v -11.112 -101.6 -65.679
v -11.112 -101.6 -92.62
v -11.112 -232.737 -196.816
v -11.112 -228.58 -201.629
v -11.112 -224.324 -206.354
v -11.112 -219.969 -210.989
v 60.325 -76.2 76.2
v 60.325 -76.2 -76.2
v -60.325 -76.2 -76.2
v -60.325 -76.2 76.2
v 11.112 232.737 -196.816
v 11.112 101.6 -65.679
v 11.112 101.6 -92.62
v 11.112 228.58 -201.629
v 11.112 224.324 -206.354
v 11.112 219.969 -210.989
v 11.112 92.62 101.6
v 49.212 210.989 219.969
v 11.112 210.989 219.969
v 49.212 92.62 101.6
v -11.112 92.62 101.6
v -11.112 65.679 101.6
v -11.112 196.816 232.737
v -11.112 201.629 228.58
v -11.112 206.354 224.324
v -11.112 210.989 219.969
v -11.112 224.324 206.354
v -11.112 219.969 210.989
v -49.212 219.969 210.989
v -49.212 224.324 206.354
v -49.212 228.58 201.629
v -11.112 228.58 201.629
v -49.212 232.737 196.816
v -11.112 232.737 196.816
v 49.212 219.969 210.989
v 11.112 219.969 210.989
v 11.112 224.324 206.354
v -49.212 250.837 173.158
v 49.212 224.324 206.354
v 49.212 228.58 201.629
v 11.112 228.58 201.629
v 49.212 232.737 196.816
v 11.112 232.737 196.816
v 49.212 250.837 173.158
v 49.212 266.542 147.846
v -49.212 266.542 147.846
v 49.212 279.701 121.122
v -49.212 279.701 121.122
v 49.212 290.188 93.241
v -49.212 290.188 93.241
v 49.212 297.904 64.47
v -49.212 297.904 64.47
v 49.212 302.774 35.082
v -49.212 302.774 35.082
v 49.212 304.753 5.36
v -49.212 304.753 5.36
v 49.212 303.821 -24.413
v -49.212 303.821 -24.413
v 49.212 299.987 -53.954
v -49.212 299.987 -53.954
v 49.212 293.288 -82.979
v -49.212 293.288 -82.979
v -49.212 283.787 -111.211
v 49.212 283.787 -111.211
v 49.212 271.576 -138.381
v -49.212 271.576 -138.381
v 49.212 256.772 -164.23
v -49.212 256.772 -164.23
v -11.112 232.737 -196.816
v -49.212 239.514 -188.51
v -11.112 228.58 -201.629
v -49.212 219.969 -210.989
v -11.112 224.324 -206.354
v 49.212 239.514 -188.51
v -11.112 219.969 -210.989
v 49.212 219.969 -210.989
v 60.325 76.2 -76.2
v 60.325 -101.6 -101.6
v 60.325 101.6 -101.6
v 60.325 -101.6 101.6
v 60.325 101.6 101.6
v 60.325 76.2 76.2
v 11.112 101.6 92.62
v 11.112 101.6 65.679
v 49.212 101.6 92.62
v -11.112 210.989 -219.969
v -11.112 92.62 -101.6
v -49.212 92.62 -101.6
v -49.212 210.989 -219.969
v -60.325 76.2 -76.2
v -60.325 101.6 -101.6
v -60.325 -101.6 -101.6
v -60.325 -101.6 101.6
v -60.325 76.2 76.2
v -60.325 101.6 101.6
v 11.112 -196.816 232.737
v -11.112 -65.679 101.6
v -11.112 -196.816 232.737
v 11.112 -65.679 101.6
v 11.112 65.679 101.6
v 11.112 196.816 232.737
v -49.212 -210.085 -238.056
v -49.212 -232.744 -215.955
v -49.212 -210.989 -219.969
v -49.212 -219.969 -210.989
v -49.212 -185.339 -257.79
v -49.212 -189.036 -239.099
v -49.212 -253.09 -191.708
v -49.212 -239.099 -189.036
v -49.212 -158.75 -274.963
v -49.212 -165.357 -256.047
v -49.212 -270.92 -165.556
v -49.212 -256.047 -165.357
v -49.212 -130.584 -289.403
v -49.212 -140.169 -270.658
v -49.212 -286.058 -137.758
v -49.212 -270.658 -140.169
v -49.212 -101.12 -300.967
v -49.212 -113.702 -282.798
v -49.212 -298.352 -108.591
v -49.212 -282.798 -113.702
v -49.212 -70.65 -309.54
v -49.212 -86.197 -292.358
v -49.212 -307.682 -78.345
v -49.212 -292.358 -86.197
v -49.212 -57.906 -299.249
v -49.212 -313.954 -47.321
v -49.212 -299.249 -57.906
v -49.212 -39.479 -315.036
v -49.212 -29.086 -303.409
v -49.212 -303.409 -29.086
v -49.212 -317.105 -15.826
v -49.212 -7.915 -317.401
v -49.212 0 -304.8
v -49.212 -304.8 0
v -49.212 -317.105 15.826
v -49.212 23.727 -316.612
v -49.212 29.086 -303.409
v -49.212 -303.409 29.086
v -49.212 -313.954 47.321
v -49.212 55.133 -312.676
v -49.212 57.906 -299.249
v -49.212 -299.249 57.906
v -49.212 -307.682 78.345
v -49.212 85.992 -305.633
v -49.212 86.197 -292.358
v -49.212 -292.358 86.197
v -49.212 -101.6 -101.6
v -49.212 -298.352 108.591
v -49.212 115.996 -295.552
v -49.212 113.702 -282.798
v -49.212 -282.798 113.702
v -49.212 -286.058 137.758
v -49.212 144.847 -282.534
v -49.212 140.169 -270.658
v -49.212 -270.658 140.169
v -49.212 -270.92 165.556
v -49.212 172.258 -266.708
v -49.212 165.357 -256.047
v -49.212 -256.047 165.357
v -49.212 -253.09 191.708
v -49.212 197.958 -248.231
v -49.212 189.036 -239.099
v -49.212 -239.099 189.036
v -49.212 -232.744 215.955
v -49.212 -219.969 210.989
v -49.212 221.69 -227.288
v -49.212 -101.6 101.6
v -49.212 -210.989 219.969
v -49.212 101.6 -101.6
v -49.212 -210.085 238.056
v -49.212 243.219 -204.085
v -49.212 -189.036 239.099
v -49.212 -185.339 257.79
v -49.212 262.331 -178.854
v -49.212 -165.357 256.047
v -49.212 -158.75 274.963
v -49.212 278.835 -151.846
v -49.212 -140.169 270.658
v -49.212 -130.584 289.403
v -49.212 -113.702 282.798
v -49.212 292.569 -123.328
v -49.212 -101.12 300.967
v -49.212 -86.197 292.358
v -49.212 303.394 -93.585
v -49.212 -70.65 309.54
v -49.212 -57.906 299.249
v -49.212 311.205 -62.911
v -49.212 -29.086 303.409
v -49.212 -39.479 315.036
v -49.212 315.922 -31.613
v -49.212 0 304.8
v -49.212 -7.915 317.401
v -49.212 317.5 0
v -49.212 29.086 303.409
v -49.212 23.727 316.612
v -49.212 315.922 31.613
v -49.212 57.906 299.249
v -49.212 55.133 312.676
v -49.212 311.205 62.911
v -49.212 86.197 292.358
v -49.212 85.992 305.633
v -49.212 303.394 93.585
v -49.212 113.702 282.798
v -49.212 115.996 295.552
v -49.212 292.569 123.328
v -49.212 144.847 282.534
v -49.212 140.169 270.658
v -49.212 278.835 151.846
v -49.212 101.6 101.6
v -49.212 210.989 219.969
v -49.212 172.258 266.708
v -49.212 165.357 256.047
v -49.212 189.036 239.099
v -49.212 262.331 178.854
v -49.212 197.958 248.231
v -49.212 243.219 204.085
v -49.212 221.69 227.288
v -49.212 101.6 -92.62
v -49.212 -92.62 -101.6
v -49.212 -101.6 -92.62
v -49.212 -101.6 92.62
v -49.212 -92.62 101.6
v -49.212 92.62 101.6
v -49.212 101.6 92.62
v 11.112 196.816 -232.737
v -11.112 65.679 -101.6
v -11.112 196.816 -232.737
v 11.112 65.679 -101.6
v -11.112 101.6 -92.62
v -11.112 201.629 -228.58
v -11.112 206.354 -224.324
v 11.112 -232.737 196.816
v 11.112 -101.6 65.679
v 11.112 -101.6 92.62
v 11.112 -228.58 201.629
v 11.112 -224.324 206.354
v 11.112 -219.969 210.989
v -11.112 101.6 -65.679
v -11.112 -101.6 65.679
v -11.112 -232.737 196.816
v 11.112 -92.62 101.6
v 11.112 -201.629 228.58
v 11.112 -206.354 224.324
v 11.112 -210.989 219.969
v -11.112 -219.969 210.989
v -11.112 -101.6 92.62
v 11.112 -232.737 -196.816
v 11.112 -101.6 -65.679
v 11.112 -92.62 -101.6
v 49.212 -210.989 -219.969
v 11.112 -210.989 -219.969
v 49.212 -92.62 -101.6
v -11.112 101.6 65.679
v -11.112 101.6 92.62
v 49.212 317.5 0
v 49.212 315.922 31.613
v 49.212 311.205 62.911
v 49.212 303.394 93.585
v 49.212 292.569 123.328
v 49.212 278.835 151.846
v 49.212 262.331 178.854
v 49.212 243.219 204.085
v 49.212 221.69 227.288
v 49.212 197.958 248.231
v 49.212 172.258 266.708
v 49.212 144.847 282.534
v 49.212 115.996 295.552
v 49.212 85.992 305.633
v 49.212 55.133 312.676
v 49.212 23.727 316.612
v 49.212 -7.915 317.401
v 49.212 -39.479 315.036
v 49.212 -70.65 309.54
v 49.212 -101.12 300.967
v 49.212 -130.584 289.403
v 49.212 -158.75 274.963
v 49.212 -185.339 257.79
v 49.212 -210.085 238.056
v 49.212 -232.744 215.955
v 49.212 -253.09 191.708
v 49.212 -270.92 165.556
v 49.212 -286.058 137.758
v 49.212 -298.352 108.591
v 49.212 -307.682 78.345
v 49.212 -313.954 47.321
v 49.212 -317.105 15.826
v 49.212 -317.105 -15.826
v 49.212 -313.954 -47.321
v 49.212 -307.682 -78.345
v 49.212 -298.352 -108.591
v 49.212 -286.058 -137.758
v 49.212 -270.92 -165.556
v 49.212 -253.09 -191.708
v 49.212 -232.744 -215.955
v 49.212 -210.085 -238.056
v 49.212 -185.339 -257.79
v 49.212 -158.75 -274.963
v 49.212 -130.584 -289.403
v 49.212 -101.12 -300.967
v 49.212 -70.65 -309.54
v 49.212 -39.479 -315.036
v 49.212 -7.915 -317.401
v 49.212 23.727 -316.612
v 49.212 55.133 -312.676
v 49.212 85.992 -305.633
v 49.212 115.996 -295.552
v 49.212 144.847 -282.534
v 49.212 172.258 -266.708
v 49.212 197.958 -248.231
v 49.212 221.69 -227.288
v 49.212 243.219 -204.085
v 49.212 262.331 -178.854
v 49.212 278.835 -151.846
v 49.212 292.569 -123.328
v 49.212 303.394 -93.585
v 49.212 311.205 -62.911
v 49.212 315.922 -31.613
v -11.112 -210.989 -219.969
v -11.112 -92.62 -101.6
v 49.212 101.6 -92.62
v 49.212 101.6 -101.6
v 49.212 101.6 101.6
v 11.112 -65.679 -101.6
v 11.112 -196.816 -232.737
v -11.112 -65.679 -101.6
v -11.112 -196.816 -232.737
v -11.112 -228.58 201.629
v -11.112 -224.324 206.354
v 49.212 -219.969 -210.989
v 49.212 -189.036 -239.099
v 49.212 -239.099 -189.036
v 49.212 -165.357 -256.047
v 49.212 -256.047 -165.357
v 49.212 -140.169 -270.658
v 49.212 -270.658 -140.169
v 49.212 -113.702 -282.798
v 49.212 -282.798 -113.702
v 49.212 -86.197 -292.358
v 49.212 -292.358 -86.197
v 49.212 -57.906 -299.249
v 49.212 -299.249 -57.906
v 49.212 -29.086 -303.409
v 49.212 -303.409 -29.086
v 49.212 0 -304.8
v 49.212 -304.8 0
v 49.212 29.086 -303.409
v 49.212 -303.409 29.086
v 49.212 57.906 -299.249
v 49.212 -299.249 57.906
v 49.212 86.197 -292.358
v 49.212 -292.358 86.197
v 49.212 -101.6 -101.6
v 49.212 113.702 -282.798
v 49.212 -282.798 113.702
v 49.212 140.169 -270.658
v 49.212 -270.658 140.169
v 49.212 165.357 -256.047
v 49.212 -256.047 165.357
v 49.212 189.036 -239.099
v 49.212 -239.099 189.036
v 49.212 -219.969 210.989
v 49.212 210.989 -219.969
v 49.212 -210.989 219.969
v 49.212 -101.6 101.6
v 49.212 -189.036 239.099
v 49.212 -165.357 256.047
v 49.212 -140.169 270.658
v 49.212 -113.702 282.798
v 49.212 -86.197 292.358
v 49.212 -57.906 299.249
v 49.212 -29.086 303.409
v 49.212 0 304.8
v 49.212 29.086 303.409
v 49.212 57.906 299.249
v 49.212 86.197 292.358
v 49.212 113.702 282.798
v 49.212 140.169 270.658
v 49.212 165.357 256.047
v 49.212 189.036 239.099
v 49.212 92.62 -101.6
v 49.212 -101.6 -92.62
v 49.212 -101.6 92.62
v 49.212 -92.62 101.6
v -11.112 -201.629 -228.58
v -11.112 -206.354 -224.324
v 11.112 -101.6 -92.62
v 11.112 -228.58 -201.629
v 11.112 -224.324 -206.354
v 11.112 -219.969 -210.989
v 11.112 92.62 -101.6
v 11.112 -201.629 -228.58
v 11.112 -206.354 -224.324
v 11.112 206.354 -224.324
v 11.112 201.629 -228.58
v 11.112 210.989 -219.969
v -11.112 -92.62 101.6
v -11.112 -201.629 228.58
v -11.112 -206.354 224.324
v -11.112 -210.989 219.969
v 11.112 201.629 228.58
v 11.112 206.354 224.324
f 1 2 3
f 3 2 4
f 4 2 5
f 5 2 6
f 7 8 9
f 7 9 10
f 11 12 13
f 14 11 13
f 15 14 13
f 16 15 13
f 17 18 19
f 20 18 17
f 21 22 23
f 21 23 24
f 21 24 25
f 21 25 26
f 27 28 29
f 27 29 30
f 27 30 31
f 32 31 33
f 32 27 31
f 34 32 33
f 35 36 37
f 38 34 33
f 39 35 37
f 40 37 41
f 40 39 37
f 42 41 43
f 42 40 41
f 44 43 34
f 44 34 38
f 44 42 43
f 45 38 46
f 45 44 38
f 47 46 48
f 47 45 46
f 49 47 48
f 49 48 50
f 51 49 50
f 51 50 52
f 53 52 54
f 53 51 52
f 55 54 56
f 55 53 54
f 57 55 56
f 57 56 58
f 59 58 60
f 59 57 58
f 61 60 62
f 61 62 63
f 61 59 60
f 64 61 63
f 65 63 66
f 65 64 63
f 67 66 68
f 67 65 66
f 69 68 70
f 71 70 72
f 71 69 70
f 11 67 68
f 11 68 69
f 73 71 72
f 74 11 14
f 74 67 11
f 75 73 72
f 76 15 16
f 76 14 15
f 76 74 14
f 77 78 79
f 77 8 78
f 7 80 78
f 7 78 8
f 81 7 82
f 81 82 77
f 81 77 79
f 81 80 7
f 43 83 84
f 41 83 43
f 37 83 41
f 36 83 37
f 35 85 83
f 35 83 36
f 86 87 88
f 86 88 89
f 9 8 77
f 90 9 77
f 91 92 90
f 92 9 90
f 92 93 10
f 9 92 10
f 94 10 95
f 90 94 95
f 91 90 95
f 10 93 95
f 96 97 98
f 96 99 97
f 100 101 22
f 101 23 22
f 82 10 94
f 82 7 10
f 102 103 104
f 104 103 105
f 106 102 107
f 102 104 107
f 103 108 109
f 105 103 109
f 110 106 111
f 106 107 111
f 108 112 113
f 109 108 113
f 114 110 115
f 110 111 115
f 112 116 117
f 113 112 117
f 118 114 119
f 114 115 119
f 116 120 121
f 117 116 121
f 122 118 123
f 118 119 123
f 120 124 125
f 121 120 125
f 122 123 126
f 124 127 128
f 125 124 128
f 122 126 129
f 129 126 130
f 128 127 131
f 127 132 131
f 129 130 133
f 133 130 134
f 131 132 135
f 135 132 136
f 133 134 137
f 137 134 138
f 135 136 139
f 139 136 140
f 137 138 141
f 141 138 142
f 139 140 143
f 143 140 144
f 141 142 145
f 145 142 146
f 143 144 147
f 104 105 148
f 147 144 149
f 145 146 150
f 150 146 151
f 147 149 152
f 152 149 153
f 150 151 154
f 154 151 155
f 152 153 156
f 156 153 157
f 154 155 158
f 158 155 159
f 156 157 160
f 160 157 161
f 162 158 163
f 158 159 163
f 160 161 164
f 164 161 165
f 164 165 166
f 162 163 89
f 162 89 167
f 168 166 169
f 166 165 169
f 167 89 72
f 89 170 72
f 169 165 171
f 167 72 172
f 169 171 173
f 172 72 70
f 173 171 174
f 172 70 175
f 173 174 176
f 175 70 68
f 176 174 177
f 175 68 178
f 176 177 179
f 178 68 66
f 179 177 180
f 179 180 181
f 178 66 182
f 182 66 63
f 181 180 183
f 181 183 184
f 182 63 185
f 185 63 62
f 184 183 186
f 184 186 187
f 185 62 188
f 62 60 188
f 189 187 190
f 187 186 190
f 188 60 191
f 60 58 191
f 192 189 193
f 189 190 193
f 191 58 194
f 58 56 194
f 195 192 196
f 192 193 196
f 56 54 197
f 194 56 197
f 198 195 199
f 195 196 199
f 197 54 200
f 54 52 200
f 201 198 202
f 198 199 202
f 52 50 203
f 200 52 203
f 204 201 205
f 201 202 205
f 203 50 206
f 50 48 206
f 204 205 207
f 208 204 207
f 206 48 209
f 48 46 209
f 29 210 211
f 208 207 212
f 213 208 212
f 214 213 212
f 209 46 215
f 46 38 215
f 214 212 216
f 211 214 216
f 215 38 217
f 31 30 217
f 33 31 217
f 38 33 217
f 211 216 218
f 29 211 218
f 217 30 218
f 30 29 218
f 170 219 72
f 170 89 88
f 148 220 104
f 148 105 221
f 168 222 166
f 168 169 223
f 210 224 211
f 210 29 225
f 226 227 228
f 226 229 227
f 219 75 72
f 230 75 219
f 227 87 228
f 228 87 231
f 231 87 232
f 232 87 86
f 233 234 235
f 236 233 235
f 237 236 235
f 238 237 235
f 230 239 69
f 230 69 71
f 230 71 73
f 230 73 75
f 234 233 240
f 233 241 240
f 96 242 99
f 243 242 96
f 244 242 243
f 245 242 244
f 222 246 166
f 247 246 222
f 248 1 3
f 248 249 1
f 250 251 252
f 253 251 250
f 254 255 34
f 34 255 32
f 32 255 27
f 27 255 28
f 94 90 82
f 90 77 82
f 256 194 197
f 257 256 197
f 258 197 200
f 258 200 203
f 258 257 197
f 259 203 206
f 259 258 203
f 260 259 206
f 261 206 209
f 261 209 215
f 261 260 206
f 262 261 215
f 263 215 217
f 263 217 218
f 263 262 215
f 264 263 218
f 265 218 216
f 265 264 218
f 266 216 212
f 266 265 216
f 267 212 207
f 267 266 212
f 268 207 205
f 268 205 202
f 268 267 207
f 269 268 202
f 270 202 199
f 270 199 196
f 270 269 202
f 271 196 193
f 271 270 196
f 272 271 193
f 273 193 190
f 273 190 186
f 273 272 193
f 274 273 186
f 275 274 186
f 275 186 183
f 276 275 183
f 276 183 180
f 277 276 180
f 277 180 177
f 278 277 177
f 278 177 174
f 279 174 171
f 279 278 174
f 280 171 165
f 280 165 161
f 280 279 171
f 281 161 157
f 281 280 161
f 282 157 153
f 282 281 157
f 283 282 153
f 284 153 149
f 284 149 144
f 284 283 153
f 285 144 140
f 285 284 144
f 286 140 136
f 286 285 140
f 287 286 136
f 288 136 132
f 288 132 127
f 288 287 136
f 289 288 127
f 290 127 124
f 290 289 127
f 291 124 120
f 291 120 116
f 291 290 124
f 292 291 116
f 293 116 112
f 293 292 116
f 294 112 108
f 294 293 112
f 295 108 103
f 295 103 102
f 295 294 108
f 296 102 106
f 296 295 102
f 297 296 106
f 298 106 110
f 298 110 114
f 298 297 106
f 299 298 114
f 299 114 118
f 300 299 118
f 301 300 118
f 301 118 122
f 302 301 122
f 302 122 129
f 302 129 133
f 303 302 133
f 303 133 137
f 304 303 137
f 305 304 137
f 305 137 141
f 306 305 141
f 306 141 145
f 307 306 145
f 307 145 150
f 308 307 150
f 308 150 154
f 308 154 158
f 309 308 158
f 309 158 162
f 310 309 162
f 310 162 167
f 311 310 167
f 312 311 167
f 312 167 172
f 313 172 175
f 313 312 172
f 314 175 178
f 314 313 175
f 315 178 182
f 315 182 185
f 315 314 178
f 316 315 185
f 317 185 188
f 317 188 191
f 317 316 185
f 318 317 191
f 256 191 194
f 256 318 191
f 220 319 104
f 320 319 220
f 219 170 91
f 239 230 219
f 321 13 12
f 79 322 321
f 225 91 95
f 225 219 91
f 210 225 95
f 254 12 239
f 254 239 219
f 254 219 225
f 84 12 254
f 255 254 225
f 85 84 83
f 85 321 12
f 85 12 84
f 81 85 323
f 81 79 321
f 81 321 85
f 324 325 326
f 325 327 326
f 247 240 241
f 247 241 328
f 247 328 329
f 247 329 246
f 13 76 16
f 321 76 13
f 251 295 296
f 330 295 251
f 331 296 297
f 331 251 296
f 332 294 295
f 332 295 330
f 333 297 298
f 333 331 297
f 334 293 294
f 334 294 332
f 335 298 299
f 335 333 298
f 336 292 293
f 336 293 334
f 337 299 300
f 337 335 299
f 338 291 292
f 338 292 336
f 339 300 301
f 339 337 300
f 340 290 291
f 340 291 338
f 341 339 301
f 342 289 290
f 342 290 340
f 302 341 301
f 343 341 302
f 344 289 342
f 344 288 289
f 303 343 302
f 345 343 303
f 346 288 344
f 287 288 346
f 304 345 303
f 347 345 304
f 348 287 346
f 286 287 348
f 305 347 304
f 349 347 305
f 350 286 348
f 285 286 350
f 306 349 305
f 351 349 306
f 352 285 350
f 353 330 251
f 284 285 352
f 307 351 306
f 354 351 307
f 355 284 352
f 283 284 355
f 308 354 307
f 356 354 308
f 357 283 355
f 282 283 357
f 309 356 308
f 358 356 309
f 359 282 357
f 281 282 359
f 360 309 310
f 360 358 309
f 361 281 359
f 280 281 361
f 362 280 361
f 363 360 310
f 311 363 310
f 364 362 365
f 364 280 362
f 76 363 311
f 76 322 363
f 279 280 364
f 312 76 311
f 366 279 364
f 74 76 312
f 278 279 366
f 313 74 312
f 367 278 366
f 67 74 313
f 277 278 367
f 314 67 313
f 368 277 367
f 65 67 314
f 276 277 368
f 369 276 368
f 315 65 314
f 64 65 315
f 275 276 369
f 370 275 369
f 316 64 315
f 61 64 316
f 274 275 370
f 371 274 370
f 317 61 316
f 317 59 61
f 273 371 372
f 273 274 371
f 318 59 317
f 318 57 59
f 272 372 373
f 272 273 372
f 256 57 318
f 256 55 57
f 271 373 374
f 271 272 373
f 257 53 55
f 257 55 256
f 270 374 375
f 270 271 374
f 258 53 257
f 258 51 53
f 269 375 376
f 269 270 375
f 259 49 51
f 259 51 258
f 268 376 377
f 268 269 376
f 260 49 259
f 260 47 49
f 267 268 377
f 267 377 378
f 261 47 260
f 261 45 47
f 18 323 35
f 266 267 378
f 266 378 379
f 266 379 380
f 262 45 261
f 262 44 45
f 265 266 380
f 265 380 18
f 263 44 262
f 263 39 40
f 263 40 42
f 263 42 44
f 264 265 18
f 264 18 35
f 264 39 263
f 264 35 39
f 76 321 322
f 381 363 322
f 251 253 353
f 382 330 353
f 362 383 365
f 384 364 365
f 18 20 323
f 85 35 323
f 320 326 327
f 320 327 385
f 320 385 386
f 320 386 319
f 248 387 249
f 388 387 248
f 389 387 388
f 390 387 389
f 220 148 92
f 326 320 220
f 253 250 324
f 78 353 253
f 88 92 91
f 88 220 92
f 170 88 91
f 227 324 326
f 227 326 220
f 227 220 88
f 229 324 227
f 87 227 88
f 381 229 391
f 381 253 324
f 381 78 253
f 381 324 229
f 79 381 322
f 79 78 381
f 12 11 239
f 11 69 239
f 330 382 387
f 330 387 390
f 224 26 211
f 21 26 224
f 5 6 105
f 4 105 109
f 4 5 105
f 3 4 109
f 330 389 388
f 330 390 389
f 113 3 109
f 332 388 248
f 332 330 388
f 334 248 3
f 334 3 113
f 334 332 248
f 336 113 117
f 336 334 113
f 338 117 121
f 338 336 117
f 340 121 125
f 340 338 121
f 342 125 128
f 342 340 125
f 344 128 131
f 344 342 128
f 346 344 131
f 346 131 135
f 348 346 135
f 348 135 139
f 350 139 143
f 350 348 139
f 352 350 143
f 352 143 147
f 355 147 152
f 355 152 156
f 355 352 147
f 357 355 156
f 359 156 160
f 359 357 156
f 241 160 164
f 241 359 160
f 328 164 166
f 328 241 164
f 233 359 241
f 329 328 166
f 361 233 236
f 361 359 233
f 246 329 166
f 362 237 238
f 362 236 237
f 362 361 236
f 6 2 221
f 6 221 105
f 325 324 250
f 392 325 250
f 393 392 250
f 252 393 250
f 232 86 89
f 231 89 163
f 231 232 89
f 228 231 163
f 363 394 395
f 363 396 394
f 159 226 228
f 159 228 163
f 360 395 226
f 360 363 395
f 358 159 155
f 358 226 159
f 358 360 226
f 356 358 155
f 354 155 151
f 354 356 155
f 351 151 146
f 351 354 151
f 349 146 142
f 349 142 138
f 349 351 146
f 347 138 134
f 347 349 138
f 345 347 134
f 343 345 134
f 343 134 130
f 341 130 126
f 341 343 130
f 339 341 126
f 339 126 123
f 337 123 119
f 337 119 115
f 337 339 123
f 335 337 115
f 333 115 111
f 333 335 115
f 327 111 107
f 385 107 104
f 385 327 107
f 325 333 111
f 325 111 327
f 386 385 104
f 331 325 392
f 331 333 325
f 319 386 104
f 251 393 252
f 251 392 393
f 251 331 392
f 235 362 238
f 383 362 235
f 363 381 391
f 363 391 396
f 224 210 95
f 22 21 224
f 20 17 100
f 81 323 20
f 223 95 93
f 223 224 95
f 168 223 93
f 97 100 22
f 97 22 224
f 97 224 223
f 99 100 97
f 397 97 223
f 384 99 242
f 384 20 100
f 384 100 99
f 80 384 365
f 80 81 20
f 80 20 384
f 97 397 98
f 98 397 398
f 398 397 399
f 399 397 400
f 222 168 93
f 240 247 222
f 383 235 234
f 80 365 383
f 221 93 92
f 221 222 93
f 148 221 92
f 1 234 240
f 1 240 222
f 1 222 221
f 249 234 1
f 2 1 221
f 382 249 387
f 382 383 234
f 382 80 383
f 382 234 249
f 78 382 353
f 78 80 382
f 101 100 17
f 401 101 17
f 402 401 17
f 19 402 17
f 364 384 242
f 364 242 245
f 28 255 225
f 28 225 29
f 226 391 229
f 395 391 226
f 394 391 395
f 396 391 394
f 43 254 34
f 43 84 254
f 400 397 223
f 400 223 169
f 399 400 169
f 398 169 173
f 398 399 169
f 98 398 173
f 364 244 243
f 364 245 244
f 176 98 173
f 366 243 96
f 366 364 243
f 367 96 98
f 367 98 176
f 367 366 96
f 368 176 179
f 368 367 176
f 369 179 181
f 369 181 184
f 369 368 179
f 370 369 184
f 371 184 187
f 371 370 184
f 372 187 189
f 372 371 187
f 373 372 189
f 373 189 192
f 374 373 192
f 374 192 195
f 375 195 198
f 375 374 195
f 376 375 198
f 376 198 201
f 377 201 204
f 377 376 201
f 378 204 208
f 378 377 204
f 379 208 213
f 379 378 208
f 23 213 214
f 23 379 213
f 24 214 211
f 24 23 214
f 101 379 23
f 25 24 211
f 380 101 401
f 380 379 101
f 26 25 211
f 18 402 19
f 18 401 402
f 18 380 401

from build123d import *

# Parameters (mm, degrees)
F0_W            = 152.4
F0_H            = 152.4
F1_DEPTH        = 60.325
F2_DEPTH        = 49.2125
F2_COPIES_COUNT = 4
F3_DEPTH        = 11.1125
F3_COPIES_COUNT = 4
F0_R            = 317.5
F4_DEPTH        = 49.2125


# Not quite as in the source:
# - a pattern or mirror of a feature is missing from the dataset's text; its kind, count and spacing are read off the source's solid


with BuildPart() as f1:
    # F0 (on Right) → F1 (new body, symmetric)
    with BuildSketch(Plane.YZ):
        Polygon((101.6, -101.6), (101.6, 65.6789755157), (101.6, 92.6197438789), (101.6, 101.6), (92.6197438789, 101.6), (65.6789755157, 101.6), (-101.6, 101.6), (-101.6, -101.6), align=None)
        Rectangle(F0_W, F0_H, mode=Mode.SUBTRACT)
    extrude(amount=F1_DEPTH, both=True)

    # F0 (on Right) → F2 (join, symmetric)
    with BuildSketch(Plane.YZ):
        with BuildLine():
            Line((101.6, 92.6197438789), (219.9694977227, 210.9892416016))
            ThreePointArc((219.9694977227, 210.9892416016), (215.5261469057, 215.5261469057), (210.9892416016, 219.9694977227))
            Line((210.9892416016, 219.9694977227), (92.6197438789, 101.6))
            Line((92.6197438789, 101.6), (101.6, 101.6))
            Line((101.6, 101.6), (101.6, 92.6197438789))
        make_face()
    f2 = extrude(amount=F2_DEPTH, both=True)

    # F2_copies: F2 ×4 about axis
    f2_copies_axis = Axis((0, 0, 0), (1, 0, 0))
    for i in range(1, F2_COPIES_COUNT):
        add(f2.rotate(f2_copies_axis, i * 360 / F2_COPIES_COUNT))

    # F0 (on Right) → F3 (join, symmetric)
    with BuildSketch(Plane.YZ):
        with BuildLine():
            ThreePointArc((210.9892416016, 219.9694977227), (204.0025151944, 226.4641556502), (196.815976229, 232.7370007133))
            Line((196.815976229, 232.7370007133), (65.6789755157, 101.6))
            Line((65.6789755157, 101.6), (92.6197438789, 101.6))
            Line((92.6197438789, 101.6), (210.9892416016, 219.9694977227))
        make_face()
        with BuildLine():
            Line((101.6, 65.6789755157), (232.7370007133, 196.815976229))
            ThreePointArc((232.7370007133, 196.815976229), (226.4641556502, 204.0025151944), (219.9694977227, 210.9892416016))
            Line((219.9694977227, 210.9892416016), (101.6, 92.6197438789))
            Line((101.6, 92.6197438789), (101.6, 65.6789755157))
        make_face()
    f3 = extrude(amount=F3_DEPTH, both=True)

    # F3_copies: F3 ×4 about axis
    f3_copies_axis = Axis((0, 0, 0), (1, 0, 0))
    for i in range(1, F3_COPIES_COUNT):
        add(f3.rotate(f3_copies_axis, i * 360 / F3_COPIES_COUNT))

    # F0 (on Right) → F4 (join, symmetric)
    with BuildSketch(Plane.YZ):
        Circle(F0_R)
        with BuildLine():
            ThreePointArc((232.7370007133, 196.815976229), (286.2178172454, 104.7969517271), (304.8, 0))
            ThreePointArc((304.8, 0), (-276.4891946845, -128.2839242567), (196.815976229, 232.7370007133))
            ThreePointArc((196.815976229, 232.7370007133), (204.0025151944, 226.4641556502), (210.9892416016, 219.9694977227))
            ThreePointArc((210.9892416016, 219.9694977227), (215.5261469057, 215.5261469057), (219.9694977227, 210.9892416016))
            ThreePointArc((219.9694977227, 210.9892416016), (226.4641556502, 204.0025151944), (232.7370007133, 196.815976229))
        make_face(mode=Mode.SUBTRACT)
    extrude(amount=F4_DEPTH, both=True)


solid = f1.part
